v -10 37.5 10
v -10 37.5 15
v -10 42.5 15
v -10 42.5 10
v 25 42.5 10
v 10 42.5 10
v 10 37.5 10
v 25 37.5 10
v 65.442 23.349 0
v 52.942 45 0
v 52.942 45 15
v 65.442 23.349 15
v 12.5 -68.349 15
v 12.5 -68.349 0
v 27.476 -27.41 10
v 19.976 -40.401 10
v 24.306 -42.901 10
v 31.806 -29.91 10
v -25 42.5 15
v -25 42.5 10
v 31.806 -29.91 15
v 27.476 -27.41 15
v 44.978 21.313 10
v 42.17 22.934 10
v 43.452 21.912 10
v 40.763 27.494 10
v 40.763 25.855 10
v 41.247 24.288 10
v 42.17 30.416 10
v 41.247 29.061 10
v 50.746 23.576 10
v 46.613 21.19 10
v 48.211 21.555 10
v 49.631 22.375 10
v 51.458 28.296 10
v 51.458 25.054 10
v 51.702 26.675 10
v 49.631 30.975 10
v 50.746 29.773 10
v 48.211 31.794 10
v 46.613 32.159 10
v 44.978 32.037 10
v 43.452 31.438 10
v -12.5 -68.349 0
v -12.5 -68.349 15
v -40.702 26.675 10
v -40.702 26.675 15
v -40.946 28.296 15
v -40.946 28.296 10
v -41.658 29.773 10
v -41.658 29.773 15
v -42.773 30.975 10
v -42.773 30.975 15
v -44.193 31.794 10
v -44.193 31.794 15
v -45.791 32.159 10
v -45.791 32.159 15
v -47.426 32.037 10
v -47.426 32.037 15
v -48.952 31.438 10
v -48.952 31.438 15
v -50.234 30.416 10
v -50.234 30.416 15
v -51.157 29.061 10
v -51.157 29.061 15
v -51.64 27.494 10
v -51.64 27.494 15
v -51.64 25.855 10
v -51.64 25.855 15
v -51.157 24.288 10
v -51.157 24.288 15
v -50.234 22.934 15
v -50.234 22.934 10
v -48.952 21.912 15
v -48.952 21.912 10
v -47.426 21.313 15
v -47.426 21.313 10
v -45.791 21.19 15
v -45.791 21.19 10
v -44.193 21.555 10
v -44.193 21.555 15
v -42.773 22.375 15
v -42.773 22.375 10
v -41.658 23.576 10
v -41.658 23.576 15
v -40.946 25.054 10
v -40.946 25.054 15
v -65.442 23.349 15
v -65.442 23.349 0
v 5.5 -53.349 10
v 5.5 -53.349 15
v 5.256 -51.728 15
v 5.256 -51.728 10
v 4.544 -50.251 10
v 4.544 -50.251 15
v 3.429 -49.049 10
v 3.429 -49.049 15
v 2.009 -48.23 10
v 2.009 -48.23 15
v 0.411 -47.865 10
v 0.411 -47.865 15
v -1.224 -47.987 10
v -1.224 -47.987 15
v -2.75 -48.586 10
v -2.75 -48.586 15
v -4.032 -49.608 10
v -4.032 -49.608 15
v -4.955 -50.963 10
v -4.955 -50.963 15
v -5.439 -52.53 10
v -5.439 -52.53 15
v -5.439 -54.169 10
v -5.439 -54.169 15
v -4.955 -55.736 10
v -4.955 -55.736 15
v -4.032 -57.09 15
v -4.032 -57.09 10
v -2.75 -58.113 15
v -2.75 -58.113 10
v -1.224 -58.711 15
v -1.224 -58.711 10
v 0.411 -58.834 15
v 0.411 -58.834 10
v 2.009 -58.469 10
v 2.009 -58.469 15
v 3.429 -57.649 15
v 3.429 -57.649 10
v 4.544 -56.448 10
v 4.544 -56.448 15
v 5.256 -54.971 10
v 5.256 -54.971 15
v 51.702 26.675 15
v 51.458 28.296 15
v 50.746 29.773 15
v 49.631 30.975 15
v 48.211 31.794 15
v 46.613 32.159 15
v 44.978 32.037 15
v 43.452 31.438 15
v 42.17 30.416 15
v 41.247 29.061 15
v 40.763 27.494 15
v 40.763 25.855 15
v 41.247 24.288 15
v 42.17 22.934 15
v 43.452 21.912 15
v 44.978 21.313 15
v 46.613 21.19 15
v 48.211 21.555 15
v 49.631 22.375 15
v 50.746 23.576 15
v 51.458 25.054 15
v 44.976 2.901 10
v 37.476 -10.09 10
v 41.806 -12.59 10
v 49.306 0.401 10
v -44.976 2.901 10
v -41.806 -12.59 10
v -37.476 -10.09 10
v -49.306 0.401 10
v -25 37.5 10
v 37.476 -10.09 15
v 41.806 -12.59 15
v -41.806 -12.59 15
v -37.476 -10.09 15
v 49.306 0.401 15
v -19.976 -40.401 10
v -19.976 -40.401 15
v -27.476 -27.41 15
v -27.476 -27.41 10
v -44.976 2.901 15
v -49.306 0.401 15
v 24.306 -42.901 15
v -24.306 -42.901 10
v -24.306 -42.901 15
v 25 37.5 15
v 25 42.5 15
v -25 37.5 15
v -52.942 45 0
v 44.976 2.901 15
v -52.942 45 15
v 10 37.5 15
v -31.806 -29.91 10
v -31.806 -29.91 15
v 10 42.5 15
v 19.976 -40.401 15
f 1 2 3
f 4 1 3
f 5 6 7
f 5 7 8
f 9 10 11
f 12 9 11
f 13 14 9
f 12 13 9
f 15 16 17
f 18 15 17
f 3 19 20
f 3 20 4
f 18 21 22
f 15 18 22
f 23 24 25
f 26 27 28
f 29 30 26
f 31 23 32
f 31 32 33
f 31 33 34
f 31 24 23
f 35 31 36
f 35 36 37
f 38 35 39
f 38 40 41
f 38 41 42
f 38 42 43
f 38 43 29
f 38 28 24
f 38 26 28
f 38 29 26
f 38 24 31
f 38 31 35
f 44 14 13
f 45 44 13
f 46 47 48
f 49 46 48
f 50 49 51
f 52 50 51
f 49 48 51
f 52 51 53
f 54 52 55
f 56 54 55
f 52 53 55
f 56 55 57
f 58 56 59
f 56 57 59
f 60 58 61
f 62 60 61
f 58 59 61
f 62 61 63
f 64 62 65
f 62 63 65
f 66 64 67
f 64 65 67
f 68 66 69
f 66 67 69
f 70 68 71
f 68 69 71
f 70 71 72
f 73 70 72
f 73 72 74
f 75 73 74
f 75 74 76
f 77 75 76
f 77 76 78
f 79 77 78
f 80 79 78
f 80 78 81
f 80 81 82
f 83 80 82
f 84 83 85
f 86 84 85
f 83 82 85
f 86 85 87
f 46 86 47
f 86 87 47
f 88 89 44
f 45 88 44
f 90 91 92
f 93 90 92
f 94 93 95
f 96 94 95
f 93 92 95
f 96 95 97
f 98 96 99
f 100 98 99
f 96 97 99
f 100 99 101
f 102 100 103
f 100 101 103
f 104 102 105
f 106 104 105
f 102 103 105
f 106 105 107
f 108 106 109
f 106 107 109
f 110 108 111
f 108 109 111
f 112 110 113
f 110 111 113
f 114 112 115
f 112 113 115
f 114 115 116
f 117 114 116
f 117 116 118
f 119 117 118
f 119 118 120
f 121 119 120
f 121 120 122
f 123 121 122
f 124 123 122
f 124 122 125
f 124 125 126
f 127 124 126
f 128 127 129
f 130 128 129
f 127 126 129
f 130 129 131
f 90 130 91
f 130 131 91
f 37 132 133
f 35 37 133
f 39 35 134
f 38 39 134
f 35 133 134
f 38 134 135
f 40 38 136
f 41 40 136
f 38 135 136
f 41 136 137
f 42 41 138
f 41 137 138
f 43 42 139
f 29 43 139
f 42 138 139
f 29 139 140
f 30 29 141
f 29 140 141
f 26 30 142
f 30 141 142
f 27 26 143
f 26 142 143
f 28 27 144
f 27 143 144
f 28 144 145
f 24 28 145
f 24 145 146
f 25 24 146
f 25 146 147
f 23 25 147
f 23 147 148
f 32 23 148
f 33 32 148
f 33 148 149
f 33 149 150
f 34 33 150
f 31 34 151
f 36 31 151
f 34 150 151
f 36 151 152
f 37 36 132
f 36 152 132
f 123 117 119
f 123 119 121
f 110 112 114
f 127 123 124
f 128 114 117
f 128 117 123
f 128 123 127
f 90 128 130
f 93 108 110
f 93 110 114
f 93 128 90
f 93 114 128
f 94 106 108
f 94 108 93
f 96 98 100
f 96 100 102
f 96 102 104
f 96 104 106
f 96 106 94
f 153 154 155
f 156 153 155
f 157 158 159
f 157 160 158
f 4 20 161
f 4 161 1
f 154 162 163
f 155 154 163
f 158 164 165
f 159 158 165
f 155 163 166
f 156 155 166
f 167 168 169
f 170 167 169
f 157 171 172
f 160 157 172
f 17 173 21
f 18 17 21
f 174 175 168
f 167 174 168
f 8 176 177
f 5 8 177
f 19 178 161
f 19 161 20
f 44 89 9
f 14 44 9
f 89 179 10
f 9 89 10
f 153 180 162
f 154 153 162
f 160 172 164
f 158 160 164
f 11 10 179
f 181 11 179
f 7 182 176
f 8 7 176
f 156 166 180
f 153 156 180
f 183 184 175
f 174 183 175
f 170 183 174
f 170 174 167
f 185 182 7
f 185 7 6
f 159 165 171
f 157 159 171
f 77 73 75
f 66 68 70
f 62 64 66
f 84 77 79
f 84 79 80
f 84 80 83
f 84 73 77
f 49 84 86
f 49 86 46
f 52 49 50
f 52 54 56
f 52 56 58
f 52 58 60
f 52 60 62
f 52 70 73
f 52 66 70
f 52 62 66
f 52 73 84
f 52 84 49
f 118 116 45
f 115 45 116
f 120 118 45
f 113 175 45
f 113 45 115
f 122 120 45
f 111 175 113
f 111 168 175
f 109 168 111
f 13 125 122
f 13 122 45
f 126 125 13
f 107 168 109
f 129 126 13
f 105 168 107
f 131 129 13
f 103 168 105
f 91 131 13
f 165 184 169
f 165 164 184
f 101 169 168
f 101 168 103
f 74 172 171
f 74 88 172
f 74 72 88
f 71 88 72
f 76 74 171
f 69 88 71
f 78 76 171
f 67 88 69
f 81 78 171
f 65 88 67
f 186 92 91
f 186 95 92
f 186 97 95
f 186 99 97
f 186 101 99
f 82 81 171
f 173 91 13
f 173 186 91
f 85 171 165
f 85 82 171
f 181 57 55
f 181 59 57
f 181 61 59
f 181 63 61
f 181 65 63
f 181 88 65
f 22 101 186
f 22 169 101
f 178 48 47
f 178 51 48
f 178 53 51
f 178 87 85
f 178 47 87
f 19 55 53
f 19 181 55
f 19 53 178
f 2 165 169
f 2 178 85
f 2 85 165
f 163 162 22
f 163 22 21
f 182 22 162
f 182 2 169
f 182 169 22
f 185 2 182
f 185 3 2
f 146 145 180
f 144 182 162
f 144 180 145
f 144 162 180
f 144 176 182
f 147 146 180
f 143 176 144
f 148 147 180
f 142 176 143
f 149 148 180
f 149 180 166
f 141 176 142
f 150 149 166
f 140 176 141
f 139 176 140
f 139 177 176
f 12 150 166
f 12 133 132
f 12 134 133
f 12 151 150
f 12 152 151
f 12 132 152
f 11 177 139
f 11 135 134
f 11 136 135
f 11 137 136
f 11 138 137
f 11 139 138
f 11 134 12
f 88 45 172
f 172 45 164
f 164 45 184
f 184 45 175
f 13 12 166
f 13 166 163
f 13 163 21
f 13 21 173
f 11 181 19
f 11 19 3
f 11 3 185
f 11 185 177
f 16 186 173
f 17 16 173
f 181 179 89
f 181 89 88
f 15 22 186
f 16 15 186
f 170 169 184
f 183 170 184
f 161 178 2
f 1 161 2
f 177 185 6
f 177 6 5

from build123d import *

# Parameters (mm, degrees)
F1_DEPTH = 15
F2_SIZE  = 25
F3_W     = 15
F3_H     = 5
F4_DEPTH = 5
F5_R     = 5.5
F6_DEPTH = 5


with BuildPart() as f1:
    # F0 (on Top) → F1 (new body)
    with BuildSketch(Plane.XY):
        Polygon((-77.942286, 45), (0, -90), (77.942286, 45), align=None)
    extrude(amount=F1_DEPTH)

    # F2
    f2_edges = [f1.edges().sort_by_distance(p)[0] for p in [
        (0, -90, 7.5),
        (77.942286, 45, 7.5),
        (-77.942286, 45, 7.5),
    ]]
    chamfer(f2_edges, length=F2_SIZE)

    # F3 (on face) → F4 (cut)
    with BuildSketch(Plane.XY.offset(15)):
        with Locations((-17.5, 40)):
            Rectangle(F3_W, F3_H)
        with Locations((17.5, 40)):
            Rectangle(F3_W, F3_H)
        Polygon((41.80608, -12.589746), (49.30608, 0.400635), (44.975953, 2.900635), (37.475953, -10.089746), align=None)
        Polygon((31.80608, -29.910254), (27.475953, -27.410254), (19.975953, -40.400635), (24.30608, -42.900635), align=None)
        Polygon((-31.80608, -29.910254), (-24.30608, -42.900635), (-19.975953, -40.400635), (-27.475953, -27.410254), align=None)
        Polygon((-41.80608, -12.589746), (-37.475953, -10.089746), (-44.975953, 2.900635), (-49.30608, 0.400635), align=None)
    extrude(amount=-F4_DEPTH, mode=Mode.SUBTRACT)

    # F5 (on face) → F6 (cut)
    with BuildSketch(Plane.XY.offset(15)):
        with Locations((0, -53.349365)):
            Circle(F5_R)
        with Locations((-46.201905, 26.674682)):
            Circle(F5_R)
        with Locations((46.201905, 26.674682)):
            Circle(F5_R)
    extrude(amount=-F6_DEPTH, mode=Mode.SUBTRACT)


solid = f1.part
